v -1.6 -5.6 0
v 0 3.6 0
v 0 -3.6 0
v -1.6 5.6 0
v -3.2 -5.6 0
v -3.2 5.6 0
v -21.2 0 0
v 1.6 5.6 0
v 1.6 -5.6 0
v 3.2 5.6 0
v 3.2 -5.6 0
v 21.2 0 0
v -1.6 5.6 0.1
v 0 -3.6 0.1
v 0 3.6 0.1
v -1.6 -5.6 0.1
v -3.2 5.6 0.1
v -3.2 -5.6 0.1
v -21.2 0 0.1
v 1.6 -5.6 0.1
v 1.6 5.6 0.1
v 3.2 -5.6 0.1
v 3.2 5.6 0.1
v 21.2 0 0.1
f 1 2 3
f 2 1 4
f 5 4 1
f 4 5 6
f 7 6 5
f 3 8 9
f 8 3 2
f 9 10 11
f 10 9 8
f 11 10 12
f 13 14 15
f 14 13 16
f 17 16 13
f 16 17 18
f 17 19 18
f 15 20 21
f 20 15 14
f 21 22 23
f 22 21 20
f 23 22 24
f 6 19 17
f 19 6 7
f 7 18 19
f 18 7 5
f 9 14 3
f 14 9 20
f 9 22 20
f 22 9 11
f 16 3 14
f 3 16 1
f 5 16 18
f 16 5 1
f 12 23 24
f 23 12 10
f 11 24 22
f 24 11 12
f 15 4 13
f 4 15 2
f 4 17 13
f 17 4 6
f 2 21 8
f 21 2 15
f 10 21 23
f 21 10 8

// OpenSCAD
use <../lib.scad>
function ldraw_lib__165395f() = [
// 0 Sticker  1.4 x  5.3 Cutout Rhombus with Yellow Top
// 0 Name: 165395f.dat
// 0 Author: Takeshi Takahashi [RainbowDolphin]
// 0 !LDRAW_ORG Part UPDATE 2024-01
// 0 !LICENSE Licensed under CC BY 4.0 : see CAreadme.txt
// 
// 0 BFC CERTIFY CCW
  [0,"BFC","CERTIFY"],
  [0,"BFC","CCW"],
// 
// 0 !KEYWORDS Bricklink 6551stk01, Brickowl 930700, Flag, race car
// 0 !KEYWORDS Rebrickable 165395, Set 6551
// 
// 0 !HISTORY 2024-01-29 [OrionP] Official Update 2024-01
// 
// 
// 4 16 -4 0 14 0 0 9 0 0 -9 -4 0 -14
  [4,16,-4,0,14,0,0,9,0,0,-9,-4,0,-14],
// 4 16 -8 0 14 -4 0 14 -4 0 -14 -8 0 -14
  [4,16,-8,0,14,-4,0,14,-4,0,-14,-8,0,-14],
// 3 16 -53 0 0 -8 0 14 -8 0 -14
  [3,16,-53,0,0,-8,0,14,-8,0,-14],
// 4 16 0 0 -9 0 0 9 4 0 14 4 0 -14
  [4,16,0,0,-9,0,0,9,4,0,14,4,0,-14],
// 4 16 4 0 -14 4 0 14 8 0 14 8 0 -14
  [4,16,4,0,-14,4,0,14,8,0,14,8,0,-14],
// 3 16 8 0 -14 8 0 14 53 0 0
  [3,16,8,0,-14,8,0,14,53,0,0],
// 4 14 0 -.25 -9 0 -.25 9 -4 -.25 14 -4 -.25 -14
  [4,14,0,-.25,-9,0,-.25,9,-4,-.25,14,-4,-.25,-14],
// 4 14 -4 -.25 -14 -4 -.25 14 -8 -.25 14 -8 -.25 -14
  [4,14,-4,-.25,-14,-4,-.25,14,-8,-.25,14,-8,-.25,-14],
// 3 14 -8 -.25 14 -53 -.25 0 -8 -.25 -14
  [3,14,-8,-.25,14,-53,-.25,0,-8,-.25,-14],
// 4 14 4 -.25 14 0 -.25 9 0 -.25 -9 4 -.25 -14
  [4,14,4,-.25,14,0,-.25,9,0,-.25,-9,4,-.25,-14],
// 4 14 8 -.25 14 4 -.25 14 4 -.25 -14 8 -.25 -14
  [4,14,8,-.25,14,4,-.25,14,4,-.25,-14,8,-.25,-14],
// 3 14 8 -.25 14 8 -.25 -14 53 -.25 0
  [3,14,8,-.25,14,8,-.25,-14,53,-.25,0],
// 4 16 -53 0 0 -53 -.25 0 -8 -.25 14 -8 0 14
  [4,16,-53,0,0,-53,-.25,0,-8,-.25,14,-8,0,14],
// 4 16 -8 0 -14 -8 -.25 -14 -53 -.25 0 -53 0 0
  [4,16,-8,0,-14,-8,-.25,-14,-53,-.25,0,-53,0,0],
// 4 16 4 0 -14 4 -.25 -14 0 -.25 -9 0 0 -9
  [4,16,4,0,-14,4,-.25,-14,0,-.25,-9,0,0,-9],
// 4 16 8 0 -14 8 -.25 -14 4 -.25 -14 4 0 -14
  [4,16,8,0,-14,8,-.25,-14,4,-.25,-14,4,0,-14],
// 4 16 0 0 -9 0 -.25 -9 -4 -.25 -14 -4 0 -14
  [4,16,0,0,-9,0,-.25,-9,-4,-.25,-14,-4,0,-14],
// 4 16 -4 0 -14 -4 -.25 -14 -8 -.25 -14 -8 0 -14
  [4,16,-4,0,-14,-4,-.25,-14,-8,-.25,-14,-8,0,-14],
// 4 16 8 0 14 8 -.25 14 53 -.25 0 53 0 0
  [4,16,8,0,14,8,-.25,14,53,-.25,0,53,0,0],
// 4 16 53 0 0 53 -.25 0 8 -.25 -14 8 0 -14
  [4,16,53,0,0,53,-.25,0,8,-.25,-14,8,0,-14],
// 4 16 -4 0 14 -4 -.25 14 0 -.25 9 0 0 9
  [4,16,-4,0,14,-4,-.25,14,0,-.25,9,0,0,9],
// 4 16 -8 0 14 -8 -.25 14 -4 -.25 14 -4 0 14
  [4,16,-8,0,14,-8,-.25,14,-4,-.25,14,-4,0,14],
// 4 16 0 0 9 0 -.25 9 4 -.25 14 4 0 14
  [4,16,0,0,9,0,-.25,9,4,-.25,14,4,0,14],
// 4 16 4 0 14 4 -.25 14 8 -.25 14 8 0 14
  [4,16,4,0,14,4,-.25,14,8,-.25,14,8,0,14],
];
module ldraw_lib__165395f(step=0, col=false, unit=2/5, alt=false, line=0.2, solid=!$preview)
    makepoly(ldraw_lib__165395f(), step=step, col=col, unit=unit, alt=alt, line=line, solid=solid);
ldraw_lib__165395f(line=0.2);
